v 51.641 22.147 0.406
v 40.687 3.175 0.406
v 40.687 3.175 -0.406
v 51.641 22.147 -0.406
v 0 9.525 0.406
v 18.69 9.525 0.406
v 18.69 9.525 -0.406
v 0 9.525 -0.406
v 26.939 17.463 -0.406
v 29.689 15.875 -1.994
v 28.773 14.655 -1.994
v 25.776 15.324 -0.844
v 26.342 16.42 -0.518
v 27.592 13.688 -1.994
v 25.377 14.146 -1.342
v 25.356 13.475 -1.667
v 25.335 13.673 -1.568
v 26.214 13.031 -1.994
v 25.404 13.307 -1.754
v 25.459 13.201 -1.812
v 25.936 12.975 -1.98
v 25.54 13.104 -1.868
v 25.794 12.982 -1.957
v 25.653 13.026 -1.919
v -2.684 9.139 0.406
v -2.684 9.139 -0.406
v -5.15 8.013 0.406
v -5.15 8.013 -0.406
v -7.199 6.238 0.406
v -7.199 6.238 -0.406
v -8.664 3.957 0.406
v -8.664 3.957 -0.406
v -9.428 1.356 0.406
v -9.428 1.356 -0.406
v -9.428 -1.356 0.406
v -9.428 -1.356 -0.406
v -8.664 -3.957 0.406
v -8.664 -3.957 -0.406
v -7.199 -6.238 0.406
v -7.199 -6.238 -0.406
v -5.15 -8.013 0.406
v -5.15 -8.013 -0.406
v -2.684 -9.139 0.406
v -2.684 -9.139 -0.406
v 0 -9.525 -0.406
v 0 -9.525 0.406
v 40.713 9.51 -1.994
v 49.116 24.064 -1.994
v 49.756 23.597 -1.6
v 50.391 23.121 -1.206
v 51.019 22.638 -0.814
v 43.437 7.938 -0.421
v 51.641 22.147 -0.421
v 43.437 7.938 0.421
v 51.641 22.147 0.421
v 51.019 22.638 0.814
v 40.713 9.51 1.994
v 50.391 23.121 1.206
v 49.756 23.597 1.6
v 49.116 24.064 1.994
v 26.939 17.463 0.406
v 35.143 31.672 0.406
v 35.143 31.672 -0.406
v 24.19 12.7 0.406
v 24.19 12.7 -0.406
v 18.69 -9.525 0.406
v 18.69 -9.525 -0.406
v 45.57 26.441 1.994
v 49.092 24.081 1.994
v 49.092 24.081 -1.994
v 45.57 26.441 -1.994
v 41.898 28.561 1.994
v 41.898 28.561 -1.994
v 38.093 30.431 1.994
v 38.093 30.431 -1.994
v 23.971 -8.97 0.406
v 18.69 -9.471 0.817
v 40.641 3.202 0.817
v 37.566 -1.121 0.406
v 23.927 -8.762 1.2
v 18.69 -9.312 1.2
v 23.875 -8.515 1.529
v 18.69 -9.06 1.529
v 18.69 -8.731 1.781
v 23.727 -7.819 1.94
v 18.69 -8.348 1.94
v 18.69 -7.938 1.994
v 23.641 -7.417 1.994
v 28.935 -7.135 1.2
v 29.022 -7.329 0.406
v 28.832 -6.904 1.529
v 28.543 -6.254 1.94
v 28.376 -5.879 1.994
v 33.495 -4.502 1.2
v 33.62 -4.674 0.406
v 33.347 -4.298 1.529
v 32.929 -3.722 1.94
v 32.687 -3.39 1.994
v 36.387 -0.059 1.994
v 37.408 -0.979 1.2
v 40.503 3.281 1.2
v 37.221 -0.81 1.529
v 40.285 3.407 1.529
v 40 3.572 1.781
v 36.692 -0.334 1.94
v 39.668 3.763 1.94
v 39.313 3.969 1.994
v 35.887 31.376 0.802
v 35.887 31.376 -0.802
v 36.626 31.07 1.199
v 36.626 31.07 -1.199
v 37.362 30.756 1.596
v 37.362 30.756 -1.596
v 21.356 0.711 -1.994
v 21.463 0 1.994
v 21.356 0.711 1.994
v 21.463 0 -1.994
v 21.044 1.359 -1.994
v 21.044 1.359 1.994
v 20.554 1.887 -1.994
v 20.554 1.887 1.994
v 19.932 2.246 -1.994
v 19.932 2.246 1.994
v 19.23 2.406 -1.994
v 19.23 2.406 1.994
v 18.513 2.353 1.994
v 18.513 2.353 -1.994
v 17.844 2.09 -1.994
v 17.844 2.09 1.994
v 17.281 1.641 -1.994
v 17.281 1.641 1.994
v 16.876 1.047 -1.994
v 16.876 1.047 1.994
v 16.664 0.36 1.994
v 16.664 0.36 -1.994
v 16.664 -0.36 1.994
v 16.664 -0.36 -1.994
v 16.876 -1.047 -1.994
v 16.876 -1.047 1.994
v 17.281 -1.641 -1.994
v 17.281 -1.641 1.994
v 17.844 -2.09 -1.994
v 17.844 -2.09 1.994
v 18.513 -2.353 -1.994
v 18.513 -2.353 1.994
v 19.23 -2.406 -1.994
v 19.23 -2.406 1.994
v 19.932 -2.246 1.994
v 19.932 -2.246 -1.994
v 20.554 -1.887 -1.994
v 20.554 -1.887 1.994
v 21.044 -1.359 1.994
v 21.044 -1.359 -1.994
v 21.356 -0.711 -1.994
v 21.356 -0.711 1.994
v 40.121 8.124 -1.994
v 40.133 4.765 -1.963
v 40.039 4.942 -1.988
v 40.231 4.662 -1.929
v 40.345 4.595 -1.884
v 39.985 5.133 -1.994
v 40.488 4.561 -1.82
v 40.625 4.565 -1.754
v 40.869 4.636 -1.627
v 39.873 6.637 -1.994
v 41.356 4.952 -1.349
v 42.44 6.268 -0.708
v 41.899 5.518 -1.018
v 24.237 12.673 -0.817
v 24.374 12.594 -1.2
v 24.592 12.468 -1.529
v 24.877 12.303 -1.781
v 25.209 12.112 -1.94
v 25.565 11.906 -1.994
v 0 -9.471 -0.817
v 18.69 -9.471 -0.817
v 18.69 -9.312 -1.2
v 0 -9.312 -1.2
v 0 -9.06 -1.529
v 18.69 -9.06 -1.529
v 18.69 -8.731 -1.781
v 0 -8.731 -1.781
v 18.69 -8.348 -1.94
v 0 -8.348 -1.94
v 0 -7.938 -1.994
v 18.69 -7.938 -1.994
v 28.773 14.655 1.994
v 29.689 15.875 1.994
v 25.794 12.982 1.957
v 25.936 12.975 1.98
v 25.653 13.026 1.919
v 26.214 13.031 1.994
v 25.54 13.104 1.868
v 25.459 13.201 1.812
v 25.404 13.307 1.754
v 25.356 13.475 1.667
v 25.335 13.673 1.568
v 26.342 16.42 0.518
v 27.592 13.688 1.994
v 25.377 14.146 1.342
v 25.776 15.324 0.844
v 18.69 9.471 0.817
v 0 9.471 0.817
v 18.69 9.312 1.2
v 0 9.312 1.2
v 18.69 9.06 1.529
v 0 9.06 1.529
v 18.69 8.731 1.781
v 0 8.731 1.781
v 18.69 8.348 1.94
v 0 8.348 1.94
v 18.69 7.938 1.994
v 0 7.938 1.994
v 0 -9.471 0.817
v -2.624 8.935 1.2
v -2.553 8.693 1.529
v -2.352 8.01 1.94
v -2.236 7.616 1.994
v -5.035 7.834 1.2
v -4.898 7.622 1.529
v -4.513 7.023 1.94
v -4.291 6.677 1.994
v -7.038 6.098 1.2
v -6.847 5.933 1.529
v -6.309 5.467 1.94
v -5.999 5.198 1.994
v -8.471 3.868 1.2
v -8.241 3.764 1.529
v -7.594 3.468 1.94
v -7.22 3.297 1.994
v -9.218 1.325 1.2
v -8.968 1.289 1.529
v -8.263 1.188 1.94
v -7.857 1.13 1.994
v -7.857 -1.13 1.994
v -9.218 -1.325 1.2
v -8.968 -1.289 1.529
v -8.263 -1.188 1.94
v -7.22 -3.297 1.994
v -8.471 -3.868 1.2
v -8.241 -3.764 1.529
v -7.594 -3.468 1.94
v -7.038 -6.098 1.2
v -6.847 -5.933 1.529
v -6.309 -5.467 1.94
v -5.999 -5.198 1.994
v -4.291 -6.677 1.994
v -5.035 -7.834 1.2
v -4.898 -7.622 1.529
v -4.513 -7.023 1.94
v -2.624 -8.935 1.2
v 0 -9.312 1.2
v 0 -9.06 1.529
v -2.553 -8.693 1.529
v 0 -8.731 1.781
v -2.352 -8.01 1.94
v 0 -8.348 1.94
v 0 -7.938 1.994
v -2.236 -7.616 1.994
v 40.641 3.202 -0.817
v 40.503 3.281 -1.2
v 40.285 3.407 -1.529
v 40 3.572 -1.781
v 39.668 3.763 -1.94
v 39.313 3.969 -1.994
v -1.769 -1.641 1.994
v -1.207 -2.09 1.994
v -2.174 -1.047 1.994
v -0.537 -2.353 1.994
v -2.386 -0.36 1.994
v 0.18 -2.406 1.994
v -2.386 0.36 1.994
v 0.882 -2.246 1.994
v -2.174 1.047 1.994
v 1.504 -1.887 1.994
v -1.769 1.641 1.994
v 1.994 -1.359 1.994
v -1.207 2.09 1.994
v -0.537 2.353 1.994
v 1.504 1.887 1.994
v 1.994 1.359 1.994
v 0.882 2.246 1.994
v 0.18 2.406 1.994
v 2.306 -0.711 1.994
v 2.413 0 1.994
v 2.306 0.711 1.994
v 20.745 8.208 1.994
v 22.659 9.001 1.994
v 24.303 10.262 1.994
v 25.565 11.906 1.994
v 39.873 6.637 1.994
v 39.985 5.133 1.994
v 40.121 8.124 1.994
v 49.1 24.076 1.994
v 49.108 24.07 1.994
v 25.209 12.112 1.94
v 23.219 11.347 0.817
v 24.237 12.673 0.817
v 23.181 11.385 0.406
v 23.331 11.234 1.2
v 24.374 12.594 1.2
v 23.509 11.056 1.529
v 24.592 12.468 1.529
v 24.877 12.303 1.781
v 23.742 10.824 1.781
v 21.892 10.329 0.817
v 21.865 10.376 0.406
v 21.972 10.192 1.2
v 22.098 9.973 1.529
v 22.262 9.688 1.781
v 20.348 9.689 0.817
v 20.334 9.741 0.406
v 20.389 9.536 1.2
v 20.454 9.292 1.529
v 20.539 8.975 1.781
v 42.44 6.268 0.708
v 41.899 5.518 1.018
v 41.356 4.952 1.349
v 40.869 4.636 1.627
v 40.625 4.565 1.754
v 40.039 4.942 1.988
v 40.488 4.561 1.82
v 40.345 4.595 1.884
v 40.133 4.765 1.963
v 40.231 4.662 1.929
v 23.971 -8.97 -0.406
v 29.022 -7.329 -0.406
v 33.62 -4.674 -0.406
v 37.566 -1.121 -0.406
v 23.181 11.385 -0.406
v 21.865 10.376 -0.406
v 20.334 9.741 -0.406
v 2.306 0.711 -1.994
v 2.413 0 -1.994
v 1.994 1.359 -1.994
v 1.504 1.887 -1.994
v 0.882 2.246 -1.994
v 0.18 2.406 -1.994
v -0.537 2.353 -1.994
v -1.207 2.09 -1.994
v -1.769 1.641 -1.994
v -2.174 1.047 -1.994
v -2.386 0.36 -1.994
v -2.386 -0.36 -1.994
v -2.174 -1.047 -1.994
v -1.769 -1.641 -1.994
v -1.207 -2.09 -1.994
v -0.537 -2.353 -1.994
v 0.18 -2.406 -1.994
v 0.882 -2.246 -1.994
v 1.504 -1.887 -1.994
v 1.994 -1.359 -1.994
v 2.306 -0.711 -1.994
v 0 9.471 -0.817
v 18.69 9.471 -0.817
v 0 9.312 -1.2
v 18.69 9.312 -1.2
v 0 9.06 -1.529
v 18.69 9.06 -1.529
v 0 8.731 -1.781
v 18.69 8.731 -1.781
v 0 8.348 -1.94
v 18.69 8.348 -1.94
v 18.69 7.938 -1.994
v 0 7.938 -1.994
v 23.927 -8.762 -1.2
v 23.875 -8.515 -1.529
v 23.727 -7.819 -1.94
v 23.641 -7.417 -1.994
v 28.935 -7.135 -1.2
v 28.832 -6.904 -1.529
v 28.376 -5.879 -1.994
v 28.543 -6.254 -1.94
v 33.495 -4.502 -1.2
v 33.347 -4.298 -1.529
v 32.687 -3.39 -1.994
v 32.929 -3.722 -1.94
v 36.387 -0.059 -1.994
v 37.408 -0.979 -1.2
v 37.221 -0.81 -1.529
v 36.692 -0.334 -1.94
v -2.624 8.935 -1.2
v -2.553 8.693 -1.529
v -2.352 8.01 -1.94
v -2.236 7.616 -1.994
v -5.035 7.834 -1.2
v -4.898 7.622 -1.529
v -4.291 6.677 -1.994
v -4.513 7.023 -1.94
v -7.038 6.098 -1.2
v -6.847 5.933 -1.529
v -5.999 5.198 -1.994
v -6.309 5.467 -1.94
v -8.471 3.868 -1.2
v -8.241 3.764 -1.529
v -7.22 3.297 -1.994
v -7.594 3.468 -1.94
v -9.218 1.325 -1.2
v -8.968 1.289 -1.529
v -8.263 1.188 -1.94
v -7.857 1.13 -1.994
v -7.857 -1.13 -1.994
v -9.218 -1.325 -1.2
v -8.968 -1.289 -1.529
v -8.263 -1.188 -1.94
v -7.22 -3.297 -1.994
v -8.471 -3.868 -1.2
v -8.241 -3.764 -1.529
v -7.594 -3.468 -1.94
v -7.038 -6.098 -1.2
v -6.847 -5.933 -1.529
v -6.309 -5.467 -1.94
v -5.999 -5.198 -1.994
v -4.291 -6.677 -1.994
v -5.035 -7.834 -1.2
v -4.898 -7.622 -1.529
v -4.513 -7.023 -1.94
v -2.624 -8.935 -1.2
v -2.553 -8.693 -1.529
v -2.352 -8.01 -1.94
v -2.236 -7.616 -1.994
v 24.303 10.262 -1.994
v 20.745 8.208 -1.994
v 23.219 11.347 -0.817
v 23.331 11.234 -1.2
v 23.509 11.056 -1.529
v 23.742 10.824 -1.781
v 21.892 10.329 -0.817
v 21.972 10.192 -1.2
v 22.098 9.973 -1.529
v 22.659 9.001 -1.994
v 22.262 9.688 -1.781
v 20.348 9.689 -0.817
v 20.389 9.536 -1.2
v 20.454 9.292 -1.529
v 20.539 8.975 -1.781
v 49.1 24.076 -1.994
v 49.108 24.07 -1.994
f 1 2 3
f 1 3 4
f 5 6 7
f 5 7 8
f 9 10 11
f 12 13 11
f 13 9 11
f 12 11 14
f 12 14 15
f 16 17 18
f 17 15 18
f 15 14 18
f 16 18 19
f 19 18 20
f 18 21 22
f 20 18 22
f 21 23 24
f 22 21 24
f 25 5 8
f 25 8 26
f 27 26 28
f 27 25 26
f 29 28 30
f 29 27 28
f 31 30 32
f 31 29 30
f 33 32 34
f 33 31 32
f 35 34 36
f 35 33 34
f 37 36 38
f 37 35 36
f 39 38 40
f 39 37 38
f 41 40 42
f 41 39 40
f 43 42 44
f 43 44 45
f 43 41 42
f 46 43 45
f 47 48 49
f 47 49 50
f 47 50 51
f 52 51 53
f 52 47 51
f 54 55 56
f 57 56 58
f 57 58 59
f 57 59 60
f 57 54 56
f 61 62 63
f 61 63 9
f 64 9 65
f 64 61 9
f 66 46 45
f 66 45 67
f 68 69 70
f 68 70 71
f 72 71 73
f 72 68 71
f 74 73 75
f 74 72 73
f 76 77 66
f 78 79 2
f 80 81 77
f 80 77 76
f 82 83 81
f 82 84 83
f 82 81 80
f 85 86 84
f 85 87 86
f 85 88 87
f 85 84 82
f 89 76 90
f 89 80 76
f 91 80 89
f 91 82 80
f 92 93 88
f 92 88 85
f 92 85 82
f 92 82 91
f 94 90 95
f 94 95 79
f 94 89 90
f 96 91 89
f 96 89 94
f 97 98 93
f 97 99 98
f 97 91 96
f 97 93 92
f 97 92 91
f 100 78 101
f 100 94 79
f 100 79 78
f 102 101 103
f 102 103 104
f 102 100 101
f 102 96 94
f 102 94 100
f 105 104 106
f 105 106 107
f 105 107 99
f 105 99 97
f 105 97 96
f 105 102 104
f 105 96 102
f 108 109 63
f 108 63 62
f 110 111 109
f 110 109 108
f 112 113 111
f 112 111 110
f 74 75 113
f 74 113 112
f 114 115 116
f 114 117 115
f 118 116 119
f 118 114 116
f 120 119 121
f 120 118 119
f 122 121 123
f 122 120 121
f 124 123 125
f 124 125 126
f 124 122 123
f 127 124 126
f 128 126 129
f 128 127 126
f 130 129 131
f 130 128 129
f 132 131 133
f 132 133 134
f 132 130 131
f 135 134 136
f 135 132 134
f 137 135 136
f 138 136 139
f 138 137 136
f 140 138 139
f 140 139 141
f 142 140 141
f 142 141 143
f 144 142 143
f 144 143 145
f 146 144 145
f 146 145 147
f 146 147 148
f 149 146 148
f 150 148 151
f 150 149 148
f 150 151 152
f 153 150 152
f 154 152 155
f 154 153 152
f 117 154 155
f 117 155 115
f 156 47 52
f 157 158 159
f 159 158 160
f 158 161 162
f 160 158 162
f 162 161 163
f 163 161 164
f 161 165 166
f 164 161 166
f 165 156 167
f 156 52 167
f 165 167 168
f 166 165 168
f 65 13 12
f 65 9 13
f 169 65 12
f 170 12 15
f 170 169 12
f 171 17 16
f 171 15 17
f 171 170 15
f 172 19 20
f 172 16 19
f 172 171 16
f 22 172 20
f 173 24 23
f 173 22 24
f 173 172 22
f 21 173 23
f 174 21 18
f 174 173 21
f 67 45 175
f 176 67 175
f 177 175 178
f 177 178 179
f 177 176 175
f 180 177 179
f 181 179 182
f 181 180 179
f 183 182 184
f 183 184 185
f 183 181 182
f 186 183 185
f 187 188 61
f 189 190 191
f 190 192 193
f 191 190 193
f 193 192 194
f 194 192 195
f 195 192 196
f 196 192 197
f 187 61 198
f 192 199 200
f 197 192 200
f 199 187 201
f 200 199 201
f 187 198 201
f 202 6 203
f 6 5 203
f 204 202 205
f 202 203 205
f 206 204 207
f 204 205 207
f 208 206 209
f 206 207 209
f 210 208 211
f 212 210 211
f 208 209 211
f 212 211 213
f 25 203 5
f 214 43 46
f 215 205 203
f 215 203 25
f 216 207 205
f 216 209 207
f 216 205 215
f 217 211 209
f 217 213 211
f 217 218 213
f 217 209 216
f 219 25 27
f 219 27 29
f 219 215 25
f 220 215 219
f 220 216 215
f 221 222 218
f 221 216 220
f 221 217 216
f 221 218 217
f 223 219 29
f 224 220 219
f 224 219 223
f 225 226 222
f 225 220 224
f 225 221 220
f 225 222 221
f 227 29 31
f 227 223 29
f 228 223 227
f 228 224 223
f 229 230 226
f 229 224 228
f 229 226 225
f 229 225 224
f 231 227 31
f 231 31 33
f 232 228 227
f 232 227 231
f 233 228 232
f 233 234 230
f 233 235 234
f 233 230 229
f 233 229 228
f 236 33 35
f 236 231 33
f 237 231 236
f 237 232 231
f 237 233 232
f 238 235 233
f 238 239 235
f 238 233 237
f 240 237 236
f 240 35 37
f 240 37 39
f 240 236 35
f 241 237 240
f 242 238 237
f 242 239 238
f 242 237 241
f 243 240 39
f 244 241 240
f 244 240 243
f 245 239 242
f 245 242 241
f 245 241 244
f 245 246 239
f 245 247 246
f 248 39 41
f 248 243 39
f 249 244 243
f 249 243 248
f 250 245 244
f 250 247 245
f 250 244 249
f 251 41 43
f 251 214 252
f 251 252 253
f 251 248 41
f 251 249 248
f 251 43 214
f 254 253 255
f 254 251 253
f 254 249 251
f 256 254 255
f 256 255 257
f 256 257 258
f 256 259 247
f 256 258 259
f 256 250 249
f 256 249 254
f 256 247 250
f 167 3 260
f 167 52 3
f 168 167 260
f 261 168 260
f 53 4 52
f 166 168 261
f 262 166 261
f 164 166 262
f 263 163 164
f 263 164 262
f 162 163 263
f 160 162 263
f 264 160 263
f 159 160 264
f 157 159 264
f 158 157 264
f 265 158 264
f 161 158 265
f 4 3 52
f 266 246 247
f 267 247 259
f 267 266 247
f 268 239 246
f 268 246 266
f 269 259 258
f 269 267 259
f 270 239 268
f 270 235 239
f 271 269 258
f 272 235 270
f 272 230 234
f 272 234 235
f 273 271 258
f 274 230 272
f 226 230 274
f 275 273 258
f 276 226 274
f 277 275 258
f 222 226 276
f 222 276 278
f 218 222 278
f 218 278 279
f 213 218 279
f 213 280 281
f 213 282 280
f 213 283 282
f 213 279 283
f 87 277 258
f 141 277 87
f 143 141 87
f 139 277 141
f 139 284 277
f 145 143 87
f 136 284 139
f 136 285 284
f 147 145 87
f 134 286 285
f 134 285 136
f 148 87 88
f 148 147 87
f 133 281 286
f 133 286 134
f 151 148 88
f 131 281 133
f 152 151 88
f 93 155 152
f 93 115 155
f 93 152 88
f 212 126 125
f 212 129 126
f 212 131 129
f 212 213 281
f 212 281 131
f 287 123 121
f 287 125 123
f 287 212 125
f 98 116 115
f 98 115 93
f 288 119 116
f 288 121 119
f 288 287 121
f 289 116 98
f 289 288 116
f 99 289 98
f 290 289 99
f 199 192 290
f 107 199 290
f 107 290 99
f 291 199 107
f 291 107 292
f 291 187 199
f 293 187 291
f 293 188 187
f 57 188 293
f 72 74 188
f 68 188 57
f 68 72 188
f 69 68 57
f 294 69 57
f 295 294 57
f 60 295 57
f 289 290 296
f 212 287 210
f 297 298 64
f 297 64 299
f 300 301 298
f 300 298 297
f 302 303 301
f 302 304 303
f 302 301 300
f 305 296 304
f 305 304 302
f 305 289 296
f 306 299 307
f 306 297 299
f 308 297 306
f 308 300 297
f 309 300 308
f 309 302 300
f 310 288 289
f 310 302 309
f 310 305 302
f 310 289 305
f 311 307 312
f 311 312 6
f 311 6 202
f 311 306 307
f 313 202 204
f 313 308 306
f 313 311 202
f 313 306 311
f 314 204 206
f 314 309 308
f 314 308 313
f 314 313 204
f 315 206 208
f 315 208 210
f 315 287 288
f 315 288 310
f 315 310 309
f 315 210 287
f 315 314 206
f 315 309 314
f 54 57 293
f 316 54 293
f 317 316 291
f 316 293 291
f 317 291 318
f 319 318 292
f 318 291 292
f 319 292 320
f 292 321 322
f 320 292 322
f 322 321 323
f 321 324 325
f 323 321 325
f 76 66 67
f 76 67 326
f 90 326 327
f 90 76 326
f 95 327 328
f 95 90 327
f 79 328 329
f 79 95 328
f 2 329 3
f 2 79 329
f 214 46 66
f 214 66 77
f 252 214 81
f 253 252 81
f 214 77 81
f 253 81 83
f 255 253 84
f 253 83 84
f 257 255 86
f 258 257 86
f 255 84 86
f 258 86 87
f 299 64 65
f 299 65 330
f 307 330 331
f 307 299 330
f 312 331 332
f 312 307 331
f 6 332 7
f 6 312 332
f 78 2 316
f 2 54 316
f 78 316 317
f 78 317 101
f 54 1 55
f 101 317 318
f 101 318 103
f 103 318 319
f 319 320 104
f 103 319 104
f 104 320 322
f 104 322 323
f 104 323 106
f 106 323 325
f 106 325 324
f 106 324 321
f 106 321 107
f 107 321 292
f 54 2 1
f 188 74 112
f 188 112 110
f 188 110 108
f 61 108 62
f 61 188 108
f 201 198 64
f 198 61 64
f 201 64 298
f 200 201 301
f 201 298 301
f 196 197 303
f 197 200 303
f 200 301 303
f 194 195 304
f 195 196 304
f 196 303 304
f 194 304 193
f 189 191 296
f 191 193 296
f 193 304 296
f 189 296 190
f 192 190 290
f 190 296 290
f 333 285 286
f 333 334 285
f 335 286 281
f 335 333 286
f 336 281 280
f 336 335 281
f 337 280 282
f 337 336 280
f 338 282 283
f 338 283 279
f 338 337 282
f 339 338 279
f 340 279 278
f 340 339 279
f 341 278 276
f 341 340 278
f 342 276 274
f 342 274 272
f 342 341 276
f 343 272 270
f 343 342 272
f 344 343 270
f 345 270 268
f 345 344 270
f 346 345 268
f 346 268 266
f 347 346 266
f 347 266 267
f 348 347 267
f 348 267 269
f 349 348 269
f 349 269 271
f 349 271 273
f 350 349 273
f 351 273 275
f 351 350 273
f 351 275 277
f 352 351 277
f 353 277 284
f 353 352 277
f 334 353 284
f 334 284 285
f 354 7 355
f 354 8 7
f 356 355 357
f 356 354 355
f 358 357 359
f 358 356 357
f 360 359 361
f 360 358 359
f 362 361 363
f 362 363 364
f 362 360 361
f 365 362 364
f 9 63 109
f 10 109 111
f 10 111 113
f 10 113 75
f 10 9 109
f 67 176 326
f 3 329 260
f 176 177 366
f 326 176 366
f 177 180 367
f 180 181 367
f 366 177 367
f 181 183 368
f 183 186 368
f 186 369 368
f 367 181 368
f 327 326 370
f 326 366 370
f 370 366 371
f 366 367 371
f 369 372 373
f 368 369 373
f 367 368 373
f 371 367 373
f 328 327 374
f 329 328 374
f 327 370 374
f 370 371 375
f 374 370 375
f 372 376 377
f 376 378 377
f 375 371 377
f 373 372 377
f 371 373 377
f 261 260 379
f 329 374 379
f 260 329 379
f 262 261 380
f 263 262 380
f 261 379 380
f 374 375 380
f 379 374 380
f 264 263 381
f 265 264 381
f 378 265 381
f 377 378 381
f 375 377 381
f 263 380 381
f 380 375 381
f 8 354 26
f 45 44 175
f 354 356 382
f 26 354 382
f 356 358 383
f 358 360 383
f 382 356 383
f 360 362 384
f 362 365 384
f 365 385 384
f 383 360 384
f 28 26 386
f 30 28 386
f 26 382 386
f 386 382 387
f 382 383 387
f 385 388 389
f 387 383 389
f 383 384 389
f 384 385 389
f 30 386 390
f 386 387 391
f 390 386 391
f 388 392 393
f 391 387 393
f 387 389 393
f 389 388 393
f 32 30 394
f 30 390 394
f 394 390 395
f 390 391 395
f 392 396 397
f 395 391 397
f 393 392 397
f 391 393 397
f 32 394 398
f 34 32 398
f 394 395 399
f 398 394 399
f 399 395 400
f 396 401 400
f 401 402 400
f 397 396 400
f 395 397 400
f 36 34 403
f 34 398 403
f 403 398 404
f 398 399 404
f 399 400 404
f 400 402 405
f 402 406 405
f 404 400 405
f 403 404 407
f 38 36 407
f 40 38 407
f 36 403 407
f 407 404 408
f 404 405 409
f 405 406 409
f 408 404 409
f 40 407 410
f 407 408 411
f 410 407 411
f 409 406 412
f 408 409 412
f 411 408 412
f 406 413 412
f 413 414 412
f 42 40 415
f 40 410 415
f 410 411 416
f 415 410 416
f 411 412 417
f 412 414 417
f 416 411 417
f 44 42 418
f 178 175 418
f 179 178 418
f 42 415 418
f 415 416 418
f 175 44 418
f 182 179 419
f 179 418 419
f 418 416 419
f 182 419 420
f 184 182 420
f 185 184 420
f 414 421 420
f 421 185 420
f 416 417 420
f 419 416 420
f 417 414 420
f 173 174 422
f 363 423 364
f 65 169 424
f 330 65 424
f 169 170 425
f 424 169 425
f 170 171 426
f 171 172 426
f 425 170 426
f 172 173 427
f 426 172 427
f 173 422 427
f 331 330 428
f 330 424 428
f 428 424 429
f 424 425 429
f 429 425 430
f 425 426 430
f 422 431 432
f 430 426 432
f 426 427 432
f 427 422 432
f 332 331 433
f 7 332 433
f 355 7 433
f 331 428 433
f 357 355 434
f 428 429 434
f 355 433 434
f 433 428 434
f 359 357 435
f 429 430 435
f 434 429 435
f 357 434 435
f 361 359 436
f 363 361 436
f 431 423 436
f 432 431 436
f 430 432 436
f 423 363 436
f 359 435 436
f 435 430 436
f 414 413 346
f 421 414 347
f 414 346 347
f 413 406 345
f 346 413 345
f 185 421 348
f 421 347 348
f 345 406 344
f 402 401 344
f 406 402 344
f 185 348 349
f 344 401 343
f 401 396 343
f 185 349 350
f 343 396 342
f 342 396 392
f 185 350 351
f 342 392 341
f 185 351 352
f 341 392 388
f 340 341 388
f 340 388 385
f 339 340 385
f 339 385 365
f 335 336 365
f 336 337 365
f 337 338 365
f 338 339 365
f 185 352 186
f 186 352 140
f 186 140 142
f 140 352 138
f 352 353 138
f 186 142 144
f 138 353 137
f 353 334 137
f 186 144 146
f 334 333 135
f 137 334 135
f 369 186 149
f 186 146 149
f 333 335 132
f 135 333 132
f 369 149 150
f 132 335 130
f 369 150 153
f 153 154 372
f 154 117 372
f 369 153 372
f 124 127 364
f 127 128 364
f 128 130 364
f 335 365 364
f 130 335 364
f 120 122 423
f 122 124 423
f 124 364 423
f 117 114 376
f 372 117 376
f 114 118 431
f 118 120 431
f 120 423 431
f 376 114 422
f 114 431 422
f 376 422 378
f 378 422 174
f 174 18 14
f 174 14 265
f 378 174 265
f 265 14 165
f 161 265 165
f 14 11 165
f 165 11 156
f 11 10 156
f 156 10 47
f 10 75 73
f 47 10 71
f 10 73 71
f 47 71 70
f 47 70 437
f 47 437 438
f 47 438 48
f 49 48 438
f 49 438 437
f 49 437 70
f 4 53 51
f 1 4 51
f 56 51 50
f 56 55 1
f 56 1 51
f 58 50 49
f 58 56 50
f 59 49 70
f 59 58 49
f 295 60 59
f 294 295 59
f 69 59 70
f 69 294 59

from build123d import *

# Parameters (mm, degrees)
F0_R     = 2.413
F1_DEPTH = 1.9939
F4_R     = 1.5875


with BuildPart() as f1:
    # F0 (on Top) → F1 (new body, symmetric)
    with BuildSketch(Plane.XY):
        with BuildLine():
            Line((18.6904355234, 9.525), (0, 9.525))
            ThreePointArc((0, 9.525), (-9.525, 0), (0, -9.525))
            Line((0, -9.525), (18.6904355234, -9.525))
            ThreePointArc((18.6904355234, -9.525), (31.3904355234, -6.1220452561), (40.6874807795, 3.175))
            ThreePointArc((40.6874807795, 3.175), (39.8367420935, 6.35), (40.6874807795, 9.525))
            Line((40.6874807795, 9.525), (49.0916124422, 24.0813830332))
            ThreePointArc((49.0916124422, 24.0813830332), (43.7515, 27.5320369653), (38.0930898141, 30.4313830332))
            Line((38.0930898141, 30.4313830332), (29.6889581514, 15.875))
            ThreePointArc((29.6889581514, 15.875), (27.3646968374, 13.550738686), (24.1896968374, 12.7))
            ThreePointArc((24.1896968374, 12.7), (21.8654355234, 10.375738686), (18.6904355234, 9.525))
        make_face()
        Circle(F0_R, mode=Mode.SUBTRACT)
        with Locations((19.05, 0)):
            Circle(F0_R, mode=Mode.SUBTRACT)
        with BuildLine():
            Line((35.143388423, 31.6723503567), (24.1896968374, 12.7))
            ThreePointArc((24.1896968374, 12.7), (27.3646968374, 13.550738686), (29.6889581514, 15.875))
            Line((29.6889581514, 15.875), (38.0930898141, 30.4313830332))
            ThreePointArc((38.0930898141, 30.4313830332), (36.6260577586, 31.0704511113), (35.143388423, 31.6723503567))
        make_face()
        with BuildLine():
            ThreePointArc((40.6874807795, 9.525), (39.8367420935, 6.35), (40.6874807795, 3.175))
            Line((40.6874807795, 3.175), (51.6411723651, 22.1473503567))
            ThreePointArc((51.6411723651, 22.1473503567), (50.3785776603, 23.130430044), (49.0916124422, 24.0813830332))
            Line((49.0916124422, 24.0813830332), (40.6874807795, 9.525))
        make_face()
    extrude(amount=F1_DEPTH, both=True)

    # F4
    f4_edges = [f1.edges().sort_by_distance(p)[0] for p in [
        (31.390436, -6.122045, 1.9939),
        (31.390436, -6.122045, -1.9939),
    ]]
    fillet(f4_edges, radius=F4_R)

    # F5: sweep along a path in F0
    with BuildLine(Plane.XY) as f5_path:
        Line((44.5967970303, 41.6961343692), (29.6889581514, 15.875))
        ThreePointArc((29.6889581514, 15.875), (27.3646968374, 13.550738686), (24.1896968374, 12.7))
    # F3 (on line) → F5 (sweep, cut)
    with BuildSketch(Plane(origin=(22.8595967149, 39.5939829508, 0), x_dir=(-0.8660254038, 0.5, 0), z_dir=(0.5, 0.8660254038, 0))):
        Polygon((-17.773891971, 1.9939), (-14.598891971, 0.4064), (-14.598891971, 1.9939), align=None)
        Polygon((-14.598891971, -0.4064), (-17.773891971, -1.9939), (-14.598891971, -1.9939), align=None)
    sweep(path=f5_path.line, mode=Mode.SUBTRACT)

    # F6: sweep along a path in F0
    with BuildLine(Plane.XY) as f6_path:
        Line((55.5953196584, 35.3461343692), (40.6874807795, 9.525))
        ThreePointArc((40.6874807795, 9.525), (39.8367420935, 6.35), (40.6874807795, 3.175))
    # F3 (on line) → F6 (sweep, cut)
    with BuildSketch(Plane(origin=(22.8595967149, 39.5939829508, 0), x_dir=(-0.8660254038, 0.5, 0), z_dir=(0.5, 0.8660254038, 0))):
        Polygon((-33.648891971, 1.9939), (-33.648891971, 0.4213609829), (-30.5038139368, 1.9939), align=None)
        Polygon((-33.648891971, -0.4213609829), (-33.648891971, -1.9939), (-30.5038139368, -1.9939), align=None)
    sweep(path=f6_path.line, mode=Mode.SUBTRACT)


solid = f1.part
